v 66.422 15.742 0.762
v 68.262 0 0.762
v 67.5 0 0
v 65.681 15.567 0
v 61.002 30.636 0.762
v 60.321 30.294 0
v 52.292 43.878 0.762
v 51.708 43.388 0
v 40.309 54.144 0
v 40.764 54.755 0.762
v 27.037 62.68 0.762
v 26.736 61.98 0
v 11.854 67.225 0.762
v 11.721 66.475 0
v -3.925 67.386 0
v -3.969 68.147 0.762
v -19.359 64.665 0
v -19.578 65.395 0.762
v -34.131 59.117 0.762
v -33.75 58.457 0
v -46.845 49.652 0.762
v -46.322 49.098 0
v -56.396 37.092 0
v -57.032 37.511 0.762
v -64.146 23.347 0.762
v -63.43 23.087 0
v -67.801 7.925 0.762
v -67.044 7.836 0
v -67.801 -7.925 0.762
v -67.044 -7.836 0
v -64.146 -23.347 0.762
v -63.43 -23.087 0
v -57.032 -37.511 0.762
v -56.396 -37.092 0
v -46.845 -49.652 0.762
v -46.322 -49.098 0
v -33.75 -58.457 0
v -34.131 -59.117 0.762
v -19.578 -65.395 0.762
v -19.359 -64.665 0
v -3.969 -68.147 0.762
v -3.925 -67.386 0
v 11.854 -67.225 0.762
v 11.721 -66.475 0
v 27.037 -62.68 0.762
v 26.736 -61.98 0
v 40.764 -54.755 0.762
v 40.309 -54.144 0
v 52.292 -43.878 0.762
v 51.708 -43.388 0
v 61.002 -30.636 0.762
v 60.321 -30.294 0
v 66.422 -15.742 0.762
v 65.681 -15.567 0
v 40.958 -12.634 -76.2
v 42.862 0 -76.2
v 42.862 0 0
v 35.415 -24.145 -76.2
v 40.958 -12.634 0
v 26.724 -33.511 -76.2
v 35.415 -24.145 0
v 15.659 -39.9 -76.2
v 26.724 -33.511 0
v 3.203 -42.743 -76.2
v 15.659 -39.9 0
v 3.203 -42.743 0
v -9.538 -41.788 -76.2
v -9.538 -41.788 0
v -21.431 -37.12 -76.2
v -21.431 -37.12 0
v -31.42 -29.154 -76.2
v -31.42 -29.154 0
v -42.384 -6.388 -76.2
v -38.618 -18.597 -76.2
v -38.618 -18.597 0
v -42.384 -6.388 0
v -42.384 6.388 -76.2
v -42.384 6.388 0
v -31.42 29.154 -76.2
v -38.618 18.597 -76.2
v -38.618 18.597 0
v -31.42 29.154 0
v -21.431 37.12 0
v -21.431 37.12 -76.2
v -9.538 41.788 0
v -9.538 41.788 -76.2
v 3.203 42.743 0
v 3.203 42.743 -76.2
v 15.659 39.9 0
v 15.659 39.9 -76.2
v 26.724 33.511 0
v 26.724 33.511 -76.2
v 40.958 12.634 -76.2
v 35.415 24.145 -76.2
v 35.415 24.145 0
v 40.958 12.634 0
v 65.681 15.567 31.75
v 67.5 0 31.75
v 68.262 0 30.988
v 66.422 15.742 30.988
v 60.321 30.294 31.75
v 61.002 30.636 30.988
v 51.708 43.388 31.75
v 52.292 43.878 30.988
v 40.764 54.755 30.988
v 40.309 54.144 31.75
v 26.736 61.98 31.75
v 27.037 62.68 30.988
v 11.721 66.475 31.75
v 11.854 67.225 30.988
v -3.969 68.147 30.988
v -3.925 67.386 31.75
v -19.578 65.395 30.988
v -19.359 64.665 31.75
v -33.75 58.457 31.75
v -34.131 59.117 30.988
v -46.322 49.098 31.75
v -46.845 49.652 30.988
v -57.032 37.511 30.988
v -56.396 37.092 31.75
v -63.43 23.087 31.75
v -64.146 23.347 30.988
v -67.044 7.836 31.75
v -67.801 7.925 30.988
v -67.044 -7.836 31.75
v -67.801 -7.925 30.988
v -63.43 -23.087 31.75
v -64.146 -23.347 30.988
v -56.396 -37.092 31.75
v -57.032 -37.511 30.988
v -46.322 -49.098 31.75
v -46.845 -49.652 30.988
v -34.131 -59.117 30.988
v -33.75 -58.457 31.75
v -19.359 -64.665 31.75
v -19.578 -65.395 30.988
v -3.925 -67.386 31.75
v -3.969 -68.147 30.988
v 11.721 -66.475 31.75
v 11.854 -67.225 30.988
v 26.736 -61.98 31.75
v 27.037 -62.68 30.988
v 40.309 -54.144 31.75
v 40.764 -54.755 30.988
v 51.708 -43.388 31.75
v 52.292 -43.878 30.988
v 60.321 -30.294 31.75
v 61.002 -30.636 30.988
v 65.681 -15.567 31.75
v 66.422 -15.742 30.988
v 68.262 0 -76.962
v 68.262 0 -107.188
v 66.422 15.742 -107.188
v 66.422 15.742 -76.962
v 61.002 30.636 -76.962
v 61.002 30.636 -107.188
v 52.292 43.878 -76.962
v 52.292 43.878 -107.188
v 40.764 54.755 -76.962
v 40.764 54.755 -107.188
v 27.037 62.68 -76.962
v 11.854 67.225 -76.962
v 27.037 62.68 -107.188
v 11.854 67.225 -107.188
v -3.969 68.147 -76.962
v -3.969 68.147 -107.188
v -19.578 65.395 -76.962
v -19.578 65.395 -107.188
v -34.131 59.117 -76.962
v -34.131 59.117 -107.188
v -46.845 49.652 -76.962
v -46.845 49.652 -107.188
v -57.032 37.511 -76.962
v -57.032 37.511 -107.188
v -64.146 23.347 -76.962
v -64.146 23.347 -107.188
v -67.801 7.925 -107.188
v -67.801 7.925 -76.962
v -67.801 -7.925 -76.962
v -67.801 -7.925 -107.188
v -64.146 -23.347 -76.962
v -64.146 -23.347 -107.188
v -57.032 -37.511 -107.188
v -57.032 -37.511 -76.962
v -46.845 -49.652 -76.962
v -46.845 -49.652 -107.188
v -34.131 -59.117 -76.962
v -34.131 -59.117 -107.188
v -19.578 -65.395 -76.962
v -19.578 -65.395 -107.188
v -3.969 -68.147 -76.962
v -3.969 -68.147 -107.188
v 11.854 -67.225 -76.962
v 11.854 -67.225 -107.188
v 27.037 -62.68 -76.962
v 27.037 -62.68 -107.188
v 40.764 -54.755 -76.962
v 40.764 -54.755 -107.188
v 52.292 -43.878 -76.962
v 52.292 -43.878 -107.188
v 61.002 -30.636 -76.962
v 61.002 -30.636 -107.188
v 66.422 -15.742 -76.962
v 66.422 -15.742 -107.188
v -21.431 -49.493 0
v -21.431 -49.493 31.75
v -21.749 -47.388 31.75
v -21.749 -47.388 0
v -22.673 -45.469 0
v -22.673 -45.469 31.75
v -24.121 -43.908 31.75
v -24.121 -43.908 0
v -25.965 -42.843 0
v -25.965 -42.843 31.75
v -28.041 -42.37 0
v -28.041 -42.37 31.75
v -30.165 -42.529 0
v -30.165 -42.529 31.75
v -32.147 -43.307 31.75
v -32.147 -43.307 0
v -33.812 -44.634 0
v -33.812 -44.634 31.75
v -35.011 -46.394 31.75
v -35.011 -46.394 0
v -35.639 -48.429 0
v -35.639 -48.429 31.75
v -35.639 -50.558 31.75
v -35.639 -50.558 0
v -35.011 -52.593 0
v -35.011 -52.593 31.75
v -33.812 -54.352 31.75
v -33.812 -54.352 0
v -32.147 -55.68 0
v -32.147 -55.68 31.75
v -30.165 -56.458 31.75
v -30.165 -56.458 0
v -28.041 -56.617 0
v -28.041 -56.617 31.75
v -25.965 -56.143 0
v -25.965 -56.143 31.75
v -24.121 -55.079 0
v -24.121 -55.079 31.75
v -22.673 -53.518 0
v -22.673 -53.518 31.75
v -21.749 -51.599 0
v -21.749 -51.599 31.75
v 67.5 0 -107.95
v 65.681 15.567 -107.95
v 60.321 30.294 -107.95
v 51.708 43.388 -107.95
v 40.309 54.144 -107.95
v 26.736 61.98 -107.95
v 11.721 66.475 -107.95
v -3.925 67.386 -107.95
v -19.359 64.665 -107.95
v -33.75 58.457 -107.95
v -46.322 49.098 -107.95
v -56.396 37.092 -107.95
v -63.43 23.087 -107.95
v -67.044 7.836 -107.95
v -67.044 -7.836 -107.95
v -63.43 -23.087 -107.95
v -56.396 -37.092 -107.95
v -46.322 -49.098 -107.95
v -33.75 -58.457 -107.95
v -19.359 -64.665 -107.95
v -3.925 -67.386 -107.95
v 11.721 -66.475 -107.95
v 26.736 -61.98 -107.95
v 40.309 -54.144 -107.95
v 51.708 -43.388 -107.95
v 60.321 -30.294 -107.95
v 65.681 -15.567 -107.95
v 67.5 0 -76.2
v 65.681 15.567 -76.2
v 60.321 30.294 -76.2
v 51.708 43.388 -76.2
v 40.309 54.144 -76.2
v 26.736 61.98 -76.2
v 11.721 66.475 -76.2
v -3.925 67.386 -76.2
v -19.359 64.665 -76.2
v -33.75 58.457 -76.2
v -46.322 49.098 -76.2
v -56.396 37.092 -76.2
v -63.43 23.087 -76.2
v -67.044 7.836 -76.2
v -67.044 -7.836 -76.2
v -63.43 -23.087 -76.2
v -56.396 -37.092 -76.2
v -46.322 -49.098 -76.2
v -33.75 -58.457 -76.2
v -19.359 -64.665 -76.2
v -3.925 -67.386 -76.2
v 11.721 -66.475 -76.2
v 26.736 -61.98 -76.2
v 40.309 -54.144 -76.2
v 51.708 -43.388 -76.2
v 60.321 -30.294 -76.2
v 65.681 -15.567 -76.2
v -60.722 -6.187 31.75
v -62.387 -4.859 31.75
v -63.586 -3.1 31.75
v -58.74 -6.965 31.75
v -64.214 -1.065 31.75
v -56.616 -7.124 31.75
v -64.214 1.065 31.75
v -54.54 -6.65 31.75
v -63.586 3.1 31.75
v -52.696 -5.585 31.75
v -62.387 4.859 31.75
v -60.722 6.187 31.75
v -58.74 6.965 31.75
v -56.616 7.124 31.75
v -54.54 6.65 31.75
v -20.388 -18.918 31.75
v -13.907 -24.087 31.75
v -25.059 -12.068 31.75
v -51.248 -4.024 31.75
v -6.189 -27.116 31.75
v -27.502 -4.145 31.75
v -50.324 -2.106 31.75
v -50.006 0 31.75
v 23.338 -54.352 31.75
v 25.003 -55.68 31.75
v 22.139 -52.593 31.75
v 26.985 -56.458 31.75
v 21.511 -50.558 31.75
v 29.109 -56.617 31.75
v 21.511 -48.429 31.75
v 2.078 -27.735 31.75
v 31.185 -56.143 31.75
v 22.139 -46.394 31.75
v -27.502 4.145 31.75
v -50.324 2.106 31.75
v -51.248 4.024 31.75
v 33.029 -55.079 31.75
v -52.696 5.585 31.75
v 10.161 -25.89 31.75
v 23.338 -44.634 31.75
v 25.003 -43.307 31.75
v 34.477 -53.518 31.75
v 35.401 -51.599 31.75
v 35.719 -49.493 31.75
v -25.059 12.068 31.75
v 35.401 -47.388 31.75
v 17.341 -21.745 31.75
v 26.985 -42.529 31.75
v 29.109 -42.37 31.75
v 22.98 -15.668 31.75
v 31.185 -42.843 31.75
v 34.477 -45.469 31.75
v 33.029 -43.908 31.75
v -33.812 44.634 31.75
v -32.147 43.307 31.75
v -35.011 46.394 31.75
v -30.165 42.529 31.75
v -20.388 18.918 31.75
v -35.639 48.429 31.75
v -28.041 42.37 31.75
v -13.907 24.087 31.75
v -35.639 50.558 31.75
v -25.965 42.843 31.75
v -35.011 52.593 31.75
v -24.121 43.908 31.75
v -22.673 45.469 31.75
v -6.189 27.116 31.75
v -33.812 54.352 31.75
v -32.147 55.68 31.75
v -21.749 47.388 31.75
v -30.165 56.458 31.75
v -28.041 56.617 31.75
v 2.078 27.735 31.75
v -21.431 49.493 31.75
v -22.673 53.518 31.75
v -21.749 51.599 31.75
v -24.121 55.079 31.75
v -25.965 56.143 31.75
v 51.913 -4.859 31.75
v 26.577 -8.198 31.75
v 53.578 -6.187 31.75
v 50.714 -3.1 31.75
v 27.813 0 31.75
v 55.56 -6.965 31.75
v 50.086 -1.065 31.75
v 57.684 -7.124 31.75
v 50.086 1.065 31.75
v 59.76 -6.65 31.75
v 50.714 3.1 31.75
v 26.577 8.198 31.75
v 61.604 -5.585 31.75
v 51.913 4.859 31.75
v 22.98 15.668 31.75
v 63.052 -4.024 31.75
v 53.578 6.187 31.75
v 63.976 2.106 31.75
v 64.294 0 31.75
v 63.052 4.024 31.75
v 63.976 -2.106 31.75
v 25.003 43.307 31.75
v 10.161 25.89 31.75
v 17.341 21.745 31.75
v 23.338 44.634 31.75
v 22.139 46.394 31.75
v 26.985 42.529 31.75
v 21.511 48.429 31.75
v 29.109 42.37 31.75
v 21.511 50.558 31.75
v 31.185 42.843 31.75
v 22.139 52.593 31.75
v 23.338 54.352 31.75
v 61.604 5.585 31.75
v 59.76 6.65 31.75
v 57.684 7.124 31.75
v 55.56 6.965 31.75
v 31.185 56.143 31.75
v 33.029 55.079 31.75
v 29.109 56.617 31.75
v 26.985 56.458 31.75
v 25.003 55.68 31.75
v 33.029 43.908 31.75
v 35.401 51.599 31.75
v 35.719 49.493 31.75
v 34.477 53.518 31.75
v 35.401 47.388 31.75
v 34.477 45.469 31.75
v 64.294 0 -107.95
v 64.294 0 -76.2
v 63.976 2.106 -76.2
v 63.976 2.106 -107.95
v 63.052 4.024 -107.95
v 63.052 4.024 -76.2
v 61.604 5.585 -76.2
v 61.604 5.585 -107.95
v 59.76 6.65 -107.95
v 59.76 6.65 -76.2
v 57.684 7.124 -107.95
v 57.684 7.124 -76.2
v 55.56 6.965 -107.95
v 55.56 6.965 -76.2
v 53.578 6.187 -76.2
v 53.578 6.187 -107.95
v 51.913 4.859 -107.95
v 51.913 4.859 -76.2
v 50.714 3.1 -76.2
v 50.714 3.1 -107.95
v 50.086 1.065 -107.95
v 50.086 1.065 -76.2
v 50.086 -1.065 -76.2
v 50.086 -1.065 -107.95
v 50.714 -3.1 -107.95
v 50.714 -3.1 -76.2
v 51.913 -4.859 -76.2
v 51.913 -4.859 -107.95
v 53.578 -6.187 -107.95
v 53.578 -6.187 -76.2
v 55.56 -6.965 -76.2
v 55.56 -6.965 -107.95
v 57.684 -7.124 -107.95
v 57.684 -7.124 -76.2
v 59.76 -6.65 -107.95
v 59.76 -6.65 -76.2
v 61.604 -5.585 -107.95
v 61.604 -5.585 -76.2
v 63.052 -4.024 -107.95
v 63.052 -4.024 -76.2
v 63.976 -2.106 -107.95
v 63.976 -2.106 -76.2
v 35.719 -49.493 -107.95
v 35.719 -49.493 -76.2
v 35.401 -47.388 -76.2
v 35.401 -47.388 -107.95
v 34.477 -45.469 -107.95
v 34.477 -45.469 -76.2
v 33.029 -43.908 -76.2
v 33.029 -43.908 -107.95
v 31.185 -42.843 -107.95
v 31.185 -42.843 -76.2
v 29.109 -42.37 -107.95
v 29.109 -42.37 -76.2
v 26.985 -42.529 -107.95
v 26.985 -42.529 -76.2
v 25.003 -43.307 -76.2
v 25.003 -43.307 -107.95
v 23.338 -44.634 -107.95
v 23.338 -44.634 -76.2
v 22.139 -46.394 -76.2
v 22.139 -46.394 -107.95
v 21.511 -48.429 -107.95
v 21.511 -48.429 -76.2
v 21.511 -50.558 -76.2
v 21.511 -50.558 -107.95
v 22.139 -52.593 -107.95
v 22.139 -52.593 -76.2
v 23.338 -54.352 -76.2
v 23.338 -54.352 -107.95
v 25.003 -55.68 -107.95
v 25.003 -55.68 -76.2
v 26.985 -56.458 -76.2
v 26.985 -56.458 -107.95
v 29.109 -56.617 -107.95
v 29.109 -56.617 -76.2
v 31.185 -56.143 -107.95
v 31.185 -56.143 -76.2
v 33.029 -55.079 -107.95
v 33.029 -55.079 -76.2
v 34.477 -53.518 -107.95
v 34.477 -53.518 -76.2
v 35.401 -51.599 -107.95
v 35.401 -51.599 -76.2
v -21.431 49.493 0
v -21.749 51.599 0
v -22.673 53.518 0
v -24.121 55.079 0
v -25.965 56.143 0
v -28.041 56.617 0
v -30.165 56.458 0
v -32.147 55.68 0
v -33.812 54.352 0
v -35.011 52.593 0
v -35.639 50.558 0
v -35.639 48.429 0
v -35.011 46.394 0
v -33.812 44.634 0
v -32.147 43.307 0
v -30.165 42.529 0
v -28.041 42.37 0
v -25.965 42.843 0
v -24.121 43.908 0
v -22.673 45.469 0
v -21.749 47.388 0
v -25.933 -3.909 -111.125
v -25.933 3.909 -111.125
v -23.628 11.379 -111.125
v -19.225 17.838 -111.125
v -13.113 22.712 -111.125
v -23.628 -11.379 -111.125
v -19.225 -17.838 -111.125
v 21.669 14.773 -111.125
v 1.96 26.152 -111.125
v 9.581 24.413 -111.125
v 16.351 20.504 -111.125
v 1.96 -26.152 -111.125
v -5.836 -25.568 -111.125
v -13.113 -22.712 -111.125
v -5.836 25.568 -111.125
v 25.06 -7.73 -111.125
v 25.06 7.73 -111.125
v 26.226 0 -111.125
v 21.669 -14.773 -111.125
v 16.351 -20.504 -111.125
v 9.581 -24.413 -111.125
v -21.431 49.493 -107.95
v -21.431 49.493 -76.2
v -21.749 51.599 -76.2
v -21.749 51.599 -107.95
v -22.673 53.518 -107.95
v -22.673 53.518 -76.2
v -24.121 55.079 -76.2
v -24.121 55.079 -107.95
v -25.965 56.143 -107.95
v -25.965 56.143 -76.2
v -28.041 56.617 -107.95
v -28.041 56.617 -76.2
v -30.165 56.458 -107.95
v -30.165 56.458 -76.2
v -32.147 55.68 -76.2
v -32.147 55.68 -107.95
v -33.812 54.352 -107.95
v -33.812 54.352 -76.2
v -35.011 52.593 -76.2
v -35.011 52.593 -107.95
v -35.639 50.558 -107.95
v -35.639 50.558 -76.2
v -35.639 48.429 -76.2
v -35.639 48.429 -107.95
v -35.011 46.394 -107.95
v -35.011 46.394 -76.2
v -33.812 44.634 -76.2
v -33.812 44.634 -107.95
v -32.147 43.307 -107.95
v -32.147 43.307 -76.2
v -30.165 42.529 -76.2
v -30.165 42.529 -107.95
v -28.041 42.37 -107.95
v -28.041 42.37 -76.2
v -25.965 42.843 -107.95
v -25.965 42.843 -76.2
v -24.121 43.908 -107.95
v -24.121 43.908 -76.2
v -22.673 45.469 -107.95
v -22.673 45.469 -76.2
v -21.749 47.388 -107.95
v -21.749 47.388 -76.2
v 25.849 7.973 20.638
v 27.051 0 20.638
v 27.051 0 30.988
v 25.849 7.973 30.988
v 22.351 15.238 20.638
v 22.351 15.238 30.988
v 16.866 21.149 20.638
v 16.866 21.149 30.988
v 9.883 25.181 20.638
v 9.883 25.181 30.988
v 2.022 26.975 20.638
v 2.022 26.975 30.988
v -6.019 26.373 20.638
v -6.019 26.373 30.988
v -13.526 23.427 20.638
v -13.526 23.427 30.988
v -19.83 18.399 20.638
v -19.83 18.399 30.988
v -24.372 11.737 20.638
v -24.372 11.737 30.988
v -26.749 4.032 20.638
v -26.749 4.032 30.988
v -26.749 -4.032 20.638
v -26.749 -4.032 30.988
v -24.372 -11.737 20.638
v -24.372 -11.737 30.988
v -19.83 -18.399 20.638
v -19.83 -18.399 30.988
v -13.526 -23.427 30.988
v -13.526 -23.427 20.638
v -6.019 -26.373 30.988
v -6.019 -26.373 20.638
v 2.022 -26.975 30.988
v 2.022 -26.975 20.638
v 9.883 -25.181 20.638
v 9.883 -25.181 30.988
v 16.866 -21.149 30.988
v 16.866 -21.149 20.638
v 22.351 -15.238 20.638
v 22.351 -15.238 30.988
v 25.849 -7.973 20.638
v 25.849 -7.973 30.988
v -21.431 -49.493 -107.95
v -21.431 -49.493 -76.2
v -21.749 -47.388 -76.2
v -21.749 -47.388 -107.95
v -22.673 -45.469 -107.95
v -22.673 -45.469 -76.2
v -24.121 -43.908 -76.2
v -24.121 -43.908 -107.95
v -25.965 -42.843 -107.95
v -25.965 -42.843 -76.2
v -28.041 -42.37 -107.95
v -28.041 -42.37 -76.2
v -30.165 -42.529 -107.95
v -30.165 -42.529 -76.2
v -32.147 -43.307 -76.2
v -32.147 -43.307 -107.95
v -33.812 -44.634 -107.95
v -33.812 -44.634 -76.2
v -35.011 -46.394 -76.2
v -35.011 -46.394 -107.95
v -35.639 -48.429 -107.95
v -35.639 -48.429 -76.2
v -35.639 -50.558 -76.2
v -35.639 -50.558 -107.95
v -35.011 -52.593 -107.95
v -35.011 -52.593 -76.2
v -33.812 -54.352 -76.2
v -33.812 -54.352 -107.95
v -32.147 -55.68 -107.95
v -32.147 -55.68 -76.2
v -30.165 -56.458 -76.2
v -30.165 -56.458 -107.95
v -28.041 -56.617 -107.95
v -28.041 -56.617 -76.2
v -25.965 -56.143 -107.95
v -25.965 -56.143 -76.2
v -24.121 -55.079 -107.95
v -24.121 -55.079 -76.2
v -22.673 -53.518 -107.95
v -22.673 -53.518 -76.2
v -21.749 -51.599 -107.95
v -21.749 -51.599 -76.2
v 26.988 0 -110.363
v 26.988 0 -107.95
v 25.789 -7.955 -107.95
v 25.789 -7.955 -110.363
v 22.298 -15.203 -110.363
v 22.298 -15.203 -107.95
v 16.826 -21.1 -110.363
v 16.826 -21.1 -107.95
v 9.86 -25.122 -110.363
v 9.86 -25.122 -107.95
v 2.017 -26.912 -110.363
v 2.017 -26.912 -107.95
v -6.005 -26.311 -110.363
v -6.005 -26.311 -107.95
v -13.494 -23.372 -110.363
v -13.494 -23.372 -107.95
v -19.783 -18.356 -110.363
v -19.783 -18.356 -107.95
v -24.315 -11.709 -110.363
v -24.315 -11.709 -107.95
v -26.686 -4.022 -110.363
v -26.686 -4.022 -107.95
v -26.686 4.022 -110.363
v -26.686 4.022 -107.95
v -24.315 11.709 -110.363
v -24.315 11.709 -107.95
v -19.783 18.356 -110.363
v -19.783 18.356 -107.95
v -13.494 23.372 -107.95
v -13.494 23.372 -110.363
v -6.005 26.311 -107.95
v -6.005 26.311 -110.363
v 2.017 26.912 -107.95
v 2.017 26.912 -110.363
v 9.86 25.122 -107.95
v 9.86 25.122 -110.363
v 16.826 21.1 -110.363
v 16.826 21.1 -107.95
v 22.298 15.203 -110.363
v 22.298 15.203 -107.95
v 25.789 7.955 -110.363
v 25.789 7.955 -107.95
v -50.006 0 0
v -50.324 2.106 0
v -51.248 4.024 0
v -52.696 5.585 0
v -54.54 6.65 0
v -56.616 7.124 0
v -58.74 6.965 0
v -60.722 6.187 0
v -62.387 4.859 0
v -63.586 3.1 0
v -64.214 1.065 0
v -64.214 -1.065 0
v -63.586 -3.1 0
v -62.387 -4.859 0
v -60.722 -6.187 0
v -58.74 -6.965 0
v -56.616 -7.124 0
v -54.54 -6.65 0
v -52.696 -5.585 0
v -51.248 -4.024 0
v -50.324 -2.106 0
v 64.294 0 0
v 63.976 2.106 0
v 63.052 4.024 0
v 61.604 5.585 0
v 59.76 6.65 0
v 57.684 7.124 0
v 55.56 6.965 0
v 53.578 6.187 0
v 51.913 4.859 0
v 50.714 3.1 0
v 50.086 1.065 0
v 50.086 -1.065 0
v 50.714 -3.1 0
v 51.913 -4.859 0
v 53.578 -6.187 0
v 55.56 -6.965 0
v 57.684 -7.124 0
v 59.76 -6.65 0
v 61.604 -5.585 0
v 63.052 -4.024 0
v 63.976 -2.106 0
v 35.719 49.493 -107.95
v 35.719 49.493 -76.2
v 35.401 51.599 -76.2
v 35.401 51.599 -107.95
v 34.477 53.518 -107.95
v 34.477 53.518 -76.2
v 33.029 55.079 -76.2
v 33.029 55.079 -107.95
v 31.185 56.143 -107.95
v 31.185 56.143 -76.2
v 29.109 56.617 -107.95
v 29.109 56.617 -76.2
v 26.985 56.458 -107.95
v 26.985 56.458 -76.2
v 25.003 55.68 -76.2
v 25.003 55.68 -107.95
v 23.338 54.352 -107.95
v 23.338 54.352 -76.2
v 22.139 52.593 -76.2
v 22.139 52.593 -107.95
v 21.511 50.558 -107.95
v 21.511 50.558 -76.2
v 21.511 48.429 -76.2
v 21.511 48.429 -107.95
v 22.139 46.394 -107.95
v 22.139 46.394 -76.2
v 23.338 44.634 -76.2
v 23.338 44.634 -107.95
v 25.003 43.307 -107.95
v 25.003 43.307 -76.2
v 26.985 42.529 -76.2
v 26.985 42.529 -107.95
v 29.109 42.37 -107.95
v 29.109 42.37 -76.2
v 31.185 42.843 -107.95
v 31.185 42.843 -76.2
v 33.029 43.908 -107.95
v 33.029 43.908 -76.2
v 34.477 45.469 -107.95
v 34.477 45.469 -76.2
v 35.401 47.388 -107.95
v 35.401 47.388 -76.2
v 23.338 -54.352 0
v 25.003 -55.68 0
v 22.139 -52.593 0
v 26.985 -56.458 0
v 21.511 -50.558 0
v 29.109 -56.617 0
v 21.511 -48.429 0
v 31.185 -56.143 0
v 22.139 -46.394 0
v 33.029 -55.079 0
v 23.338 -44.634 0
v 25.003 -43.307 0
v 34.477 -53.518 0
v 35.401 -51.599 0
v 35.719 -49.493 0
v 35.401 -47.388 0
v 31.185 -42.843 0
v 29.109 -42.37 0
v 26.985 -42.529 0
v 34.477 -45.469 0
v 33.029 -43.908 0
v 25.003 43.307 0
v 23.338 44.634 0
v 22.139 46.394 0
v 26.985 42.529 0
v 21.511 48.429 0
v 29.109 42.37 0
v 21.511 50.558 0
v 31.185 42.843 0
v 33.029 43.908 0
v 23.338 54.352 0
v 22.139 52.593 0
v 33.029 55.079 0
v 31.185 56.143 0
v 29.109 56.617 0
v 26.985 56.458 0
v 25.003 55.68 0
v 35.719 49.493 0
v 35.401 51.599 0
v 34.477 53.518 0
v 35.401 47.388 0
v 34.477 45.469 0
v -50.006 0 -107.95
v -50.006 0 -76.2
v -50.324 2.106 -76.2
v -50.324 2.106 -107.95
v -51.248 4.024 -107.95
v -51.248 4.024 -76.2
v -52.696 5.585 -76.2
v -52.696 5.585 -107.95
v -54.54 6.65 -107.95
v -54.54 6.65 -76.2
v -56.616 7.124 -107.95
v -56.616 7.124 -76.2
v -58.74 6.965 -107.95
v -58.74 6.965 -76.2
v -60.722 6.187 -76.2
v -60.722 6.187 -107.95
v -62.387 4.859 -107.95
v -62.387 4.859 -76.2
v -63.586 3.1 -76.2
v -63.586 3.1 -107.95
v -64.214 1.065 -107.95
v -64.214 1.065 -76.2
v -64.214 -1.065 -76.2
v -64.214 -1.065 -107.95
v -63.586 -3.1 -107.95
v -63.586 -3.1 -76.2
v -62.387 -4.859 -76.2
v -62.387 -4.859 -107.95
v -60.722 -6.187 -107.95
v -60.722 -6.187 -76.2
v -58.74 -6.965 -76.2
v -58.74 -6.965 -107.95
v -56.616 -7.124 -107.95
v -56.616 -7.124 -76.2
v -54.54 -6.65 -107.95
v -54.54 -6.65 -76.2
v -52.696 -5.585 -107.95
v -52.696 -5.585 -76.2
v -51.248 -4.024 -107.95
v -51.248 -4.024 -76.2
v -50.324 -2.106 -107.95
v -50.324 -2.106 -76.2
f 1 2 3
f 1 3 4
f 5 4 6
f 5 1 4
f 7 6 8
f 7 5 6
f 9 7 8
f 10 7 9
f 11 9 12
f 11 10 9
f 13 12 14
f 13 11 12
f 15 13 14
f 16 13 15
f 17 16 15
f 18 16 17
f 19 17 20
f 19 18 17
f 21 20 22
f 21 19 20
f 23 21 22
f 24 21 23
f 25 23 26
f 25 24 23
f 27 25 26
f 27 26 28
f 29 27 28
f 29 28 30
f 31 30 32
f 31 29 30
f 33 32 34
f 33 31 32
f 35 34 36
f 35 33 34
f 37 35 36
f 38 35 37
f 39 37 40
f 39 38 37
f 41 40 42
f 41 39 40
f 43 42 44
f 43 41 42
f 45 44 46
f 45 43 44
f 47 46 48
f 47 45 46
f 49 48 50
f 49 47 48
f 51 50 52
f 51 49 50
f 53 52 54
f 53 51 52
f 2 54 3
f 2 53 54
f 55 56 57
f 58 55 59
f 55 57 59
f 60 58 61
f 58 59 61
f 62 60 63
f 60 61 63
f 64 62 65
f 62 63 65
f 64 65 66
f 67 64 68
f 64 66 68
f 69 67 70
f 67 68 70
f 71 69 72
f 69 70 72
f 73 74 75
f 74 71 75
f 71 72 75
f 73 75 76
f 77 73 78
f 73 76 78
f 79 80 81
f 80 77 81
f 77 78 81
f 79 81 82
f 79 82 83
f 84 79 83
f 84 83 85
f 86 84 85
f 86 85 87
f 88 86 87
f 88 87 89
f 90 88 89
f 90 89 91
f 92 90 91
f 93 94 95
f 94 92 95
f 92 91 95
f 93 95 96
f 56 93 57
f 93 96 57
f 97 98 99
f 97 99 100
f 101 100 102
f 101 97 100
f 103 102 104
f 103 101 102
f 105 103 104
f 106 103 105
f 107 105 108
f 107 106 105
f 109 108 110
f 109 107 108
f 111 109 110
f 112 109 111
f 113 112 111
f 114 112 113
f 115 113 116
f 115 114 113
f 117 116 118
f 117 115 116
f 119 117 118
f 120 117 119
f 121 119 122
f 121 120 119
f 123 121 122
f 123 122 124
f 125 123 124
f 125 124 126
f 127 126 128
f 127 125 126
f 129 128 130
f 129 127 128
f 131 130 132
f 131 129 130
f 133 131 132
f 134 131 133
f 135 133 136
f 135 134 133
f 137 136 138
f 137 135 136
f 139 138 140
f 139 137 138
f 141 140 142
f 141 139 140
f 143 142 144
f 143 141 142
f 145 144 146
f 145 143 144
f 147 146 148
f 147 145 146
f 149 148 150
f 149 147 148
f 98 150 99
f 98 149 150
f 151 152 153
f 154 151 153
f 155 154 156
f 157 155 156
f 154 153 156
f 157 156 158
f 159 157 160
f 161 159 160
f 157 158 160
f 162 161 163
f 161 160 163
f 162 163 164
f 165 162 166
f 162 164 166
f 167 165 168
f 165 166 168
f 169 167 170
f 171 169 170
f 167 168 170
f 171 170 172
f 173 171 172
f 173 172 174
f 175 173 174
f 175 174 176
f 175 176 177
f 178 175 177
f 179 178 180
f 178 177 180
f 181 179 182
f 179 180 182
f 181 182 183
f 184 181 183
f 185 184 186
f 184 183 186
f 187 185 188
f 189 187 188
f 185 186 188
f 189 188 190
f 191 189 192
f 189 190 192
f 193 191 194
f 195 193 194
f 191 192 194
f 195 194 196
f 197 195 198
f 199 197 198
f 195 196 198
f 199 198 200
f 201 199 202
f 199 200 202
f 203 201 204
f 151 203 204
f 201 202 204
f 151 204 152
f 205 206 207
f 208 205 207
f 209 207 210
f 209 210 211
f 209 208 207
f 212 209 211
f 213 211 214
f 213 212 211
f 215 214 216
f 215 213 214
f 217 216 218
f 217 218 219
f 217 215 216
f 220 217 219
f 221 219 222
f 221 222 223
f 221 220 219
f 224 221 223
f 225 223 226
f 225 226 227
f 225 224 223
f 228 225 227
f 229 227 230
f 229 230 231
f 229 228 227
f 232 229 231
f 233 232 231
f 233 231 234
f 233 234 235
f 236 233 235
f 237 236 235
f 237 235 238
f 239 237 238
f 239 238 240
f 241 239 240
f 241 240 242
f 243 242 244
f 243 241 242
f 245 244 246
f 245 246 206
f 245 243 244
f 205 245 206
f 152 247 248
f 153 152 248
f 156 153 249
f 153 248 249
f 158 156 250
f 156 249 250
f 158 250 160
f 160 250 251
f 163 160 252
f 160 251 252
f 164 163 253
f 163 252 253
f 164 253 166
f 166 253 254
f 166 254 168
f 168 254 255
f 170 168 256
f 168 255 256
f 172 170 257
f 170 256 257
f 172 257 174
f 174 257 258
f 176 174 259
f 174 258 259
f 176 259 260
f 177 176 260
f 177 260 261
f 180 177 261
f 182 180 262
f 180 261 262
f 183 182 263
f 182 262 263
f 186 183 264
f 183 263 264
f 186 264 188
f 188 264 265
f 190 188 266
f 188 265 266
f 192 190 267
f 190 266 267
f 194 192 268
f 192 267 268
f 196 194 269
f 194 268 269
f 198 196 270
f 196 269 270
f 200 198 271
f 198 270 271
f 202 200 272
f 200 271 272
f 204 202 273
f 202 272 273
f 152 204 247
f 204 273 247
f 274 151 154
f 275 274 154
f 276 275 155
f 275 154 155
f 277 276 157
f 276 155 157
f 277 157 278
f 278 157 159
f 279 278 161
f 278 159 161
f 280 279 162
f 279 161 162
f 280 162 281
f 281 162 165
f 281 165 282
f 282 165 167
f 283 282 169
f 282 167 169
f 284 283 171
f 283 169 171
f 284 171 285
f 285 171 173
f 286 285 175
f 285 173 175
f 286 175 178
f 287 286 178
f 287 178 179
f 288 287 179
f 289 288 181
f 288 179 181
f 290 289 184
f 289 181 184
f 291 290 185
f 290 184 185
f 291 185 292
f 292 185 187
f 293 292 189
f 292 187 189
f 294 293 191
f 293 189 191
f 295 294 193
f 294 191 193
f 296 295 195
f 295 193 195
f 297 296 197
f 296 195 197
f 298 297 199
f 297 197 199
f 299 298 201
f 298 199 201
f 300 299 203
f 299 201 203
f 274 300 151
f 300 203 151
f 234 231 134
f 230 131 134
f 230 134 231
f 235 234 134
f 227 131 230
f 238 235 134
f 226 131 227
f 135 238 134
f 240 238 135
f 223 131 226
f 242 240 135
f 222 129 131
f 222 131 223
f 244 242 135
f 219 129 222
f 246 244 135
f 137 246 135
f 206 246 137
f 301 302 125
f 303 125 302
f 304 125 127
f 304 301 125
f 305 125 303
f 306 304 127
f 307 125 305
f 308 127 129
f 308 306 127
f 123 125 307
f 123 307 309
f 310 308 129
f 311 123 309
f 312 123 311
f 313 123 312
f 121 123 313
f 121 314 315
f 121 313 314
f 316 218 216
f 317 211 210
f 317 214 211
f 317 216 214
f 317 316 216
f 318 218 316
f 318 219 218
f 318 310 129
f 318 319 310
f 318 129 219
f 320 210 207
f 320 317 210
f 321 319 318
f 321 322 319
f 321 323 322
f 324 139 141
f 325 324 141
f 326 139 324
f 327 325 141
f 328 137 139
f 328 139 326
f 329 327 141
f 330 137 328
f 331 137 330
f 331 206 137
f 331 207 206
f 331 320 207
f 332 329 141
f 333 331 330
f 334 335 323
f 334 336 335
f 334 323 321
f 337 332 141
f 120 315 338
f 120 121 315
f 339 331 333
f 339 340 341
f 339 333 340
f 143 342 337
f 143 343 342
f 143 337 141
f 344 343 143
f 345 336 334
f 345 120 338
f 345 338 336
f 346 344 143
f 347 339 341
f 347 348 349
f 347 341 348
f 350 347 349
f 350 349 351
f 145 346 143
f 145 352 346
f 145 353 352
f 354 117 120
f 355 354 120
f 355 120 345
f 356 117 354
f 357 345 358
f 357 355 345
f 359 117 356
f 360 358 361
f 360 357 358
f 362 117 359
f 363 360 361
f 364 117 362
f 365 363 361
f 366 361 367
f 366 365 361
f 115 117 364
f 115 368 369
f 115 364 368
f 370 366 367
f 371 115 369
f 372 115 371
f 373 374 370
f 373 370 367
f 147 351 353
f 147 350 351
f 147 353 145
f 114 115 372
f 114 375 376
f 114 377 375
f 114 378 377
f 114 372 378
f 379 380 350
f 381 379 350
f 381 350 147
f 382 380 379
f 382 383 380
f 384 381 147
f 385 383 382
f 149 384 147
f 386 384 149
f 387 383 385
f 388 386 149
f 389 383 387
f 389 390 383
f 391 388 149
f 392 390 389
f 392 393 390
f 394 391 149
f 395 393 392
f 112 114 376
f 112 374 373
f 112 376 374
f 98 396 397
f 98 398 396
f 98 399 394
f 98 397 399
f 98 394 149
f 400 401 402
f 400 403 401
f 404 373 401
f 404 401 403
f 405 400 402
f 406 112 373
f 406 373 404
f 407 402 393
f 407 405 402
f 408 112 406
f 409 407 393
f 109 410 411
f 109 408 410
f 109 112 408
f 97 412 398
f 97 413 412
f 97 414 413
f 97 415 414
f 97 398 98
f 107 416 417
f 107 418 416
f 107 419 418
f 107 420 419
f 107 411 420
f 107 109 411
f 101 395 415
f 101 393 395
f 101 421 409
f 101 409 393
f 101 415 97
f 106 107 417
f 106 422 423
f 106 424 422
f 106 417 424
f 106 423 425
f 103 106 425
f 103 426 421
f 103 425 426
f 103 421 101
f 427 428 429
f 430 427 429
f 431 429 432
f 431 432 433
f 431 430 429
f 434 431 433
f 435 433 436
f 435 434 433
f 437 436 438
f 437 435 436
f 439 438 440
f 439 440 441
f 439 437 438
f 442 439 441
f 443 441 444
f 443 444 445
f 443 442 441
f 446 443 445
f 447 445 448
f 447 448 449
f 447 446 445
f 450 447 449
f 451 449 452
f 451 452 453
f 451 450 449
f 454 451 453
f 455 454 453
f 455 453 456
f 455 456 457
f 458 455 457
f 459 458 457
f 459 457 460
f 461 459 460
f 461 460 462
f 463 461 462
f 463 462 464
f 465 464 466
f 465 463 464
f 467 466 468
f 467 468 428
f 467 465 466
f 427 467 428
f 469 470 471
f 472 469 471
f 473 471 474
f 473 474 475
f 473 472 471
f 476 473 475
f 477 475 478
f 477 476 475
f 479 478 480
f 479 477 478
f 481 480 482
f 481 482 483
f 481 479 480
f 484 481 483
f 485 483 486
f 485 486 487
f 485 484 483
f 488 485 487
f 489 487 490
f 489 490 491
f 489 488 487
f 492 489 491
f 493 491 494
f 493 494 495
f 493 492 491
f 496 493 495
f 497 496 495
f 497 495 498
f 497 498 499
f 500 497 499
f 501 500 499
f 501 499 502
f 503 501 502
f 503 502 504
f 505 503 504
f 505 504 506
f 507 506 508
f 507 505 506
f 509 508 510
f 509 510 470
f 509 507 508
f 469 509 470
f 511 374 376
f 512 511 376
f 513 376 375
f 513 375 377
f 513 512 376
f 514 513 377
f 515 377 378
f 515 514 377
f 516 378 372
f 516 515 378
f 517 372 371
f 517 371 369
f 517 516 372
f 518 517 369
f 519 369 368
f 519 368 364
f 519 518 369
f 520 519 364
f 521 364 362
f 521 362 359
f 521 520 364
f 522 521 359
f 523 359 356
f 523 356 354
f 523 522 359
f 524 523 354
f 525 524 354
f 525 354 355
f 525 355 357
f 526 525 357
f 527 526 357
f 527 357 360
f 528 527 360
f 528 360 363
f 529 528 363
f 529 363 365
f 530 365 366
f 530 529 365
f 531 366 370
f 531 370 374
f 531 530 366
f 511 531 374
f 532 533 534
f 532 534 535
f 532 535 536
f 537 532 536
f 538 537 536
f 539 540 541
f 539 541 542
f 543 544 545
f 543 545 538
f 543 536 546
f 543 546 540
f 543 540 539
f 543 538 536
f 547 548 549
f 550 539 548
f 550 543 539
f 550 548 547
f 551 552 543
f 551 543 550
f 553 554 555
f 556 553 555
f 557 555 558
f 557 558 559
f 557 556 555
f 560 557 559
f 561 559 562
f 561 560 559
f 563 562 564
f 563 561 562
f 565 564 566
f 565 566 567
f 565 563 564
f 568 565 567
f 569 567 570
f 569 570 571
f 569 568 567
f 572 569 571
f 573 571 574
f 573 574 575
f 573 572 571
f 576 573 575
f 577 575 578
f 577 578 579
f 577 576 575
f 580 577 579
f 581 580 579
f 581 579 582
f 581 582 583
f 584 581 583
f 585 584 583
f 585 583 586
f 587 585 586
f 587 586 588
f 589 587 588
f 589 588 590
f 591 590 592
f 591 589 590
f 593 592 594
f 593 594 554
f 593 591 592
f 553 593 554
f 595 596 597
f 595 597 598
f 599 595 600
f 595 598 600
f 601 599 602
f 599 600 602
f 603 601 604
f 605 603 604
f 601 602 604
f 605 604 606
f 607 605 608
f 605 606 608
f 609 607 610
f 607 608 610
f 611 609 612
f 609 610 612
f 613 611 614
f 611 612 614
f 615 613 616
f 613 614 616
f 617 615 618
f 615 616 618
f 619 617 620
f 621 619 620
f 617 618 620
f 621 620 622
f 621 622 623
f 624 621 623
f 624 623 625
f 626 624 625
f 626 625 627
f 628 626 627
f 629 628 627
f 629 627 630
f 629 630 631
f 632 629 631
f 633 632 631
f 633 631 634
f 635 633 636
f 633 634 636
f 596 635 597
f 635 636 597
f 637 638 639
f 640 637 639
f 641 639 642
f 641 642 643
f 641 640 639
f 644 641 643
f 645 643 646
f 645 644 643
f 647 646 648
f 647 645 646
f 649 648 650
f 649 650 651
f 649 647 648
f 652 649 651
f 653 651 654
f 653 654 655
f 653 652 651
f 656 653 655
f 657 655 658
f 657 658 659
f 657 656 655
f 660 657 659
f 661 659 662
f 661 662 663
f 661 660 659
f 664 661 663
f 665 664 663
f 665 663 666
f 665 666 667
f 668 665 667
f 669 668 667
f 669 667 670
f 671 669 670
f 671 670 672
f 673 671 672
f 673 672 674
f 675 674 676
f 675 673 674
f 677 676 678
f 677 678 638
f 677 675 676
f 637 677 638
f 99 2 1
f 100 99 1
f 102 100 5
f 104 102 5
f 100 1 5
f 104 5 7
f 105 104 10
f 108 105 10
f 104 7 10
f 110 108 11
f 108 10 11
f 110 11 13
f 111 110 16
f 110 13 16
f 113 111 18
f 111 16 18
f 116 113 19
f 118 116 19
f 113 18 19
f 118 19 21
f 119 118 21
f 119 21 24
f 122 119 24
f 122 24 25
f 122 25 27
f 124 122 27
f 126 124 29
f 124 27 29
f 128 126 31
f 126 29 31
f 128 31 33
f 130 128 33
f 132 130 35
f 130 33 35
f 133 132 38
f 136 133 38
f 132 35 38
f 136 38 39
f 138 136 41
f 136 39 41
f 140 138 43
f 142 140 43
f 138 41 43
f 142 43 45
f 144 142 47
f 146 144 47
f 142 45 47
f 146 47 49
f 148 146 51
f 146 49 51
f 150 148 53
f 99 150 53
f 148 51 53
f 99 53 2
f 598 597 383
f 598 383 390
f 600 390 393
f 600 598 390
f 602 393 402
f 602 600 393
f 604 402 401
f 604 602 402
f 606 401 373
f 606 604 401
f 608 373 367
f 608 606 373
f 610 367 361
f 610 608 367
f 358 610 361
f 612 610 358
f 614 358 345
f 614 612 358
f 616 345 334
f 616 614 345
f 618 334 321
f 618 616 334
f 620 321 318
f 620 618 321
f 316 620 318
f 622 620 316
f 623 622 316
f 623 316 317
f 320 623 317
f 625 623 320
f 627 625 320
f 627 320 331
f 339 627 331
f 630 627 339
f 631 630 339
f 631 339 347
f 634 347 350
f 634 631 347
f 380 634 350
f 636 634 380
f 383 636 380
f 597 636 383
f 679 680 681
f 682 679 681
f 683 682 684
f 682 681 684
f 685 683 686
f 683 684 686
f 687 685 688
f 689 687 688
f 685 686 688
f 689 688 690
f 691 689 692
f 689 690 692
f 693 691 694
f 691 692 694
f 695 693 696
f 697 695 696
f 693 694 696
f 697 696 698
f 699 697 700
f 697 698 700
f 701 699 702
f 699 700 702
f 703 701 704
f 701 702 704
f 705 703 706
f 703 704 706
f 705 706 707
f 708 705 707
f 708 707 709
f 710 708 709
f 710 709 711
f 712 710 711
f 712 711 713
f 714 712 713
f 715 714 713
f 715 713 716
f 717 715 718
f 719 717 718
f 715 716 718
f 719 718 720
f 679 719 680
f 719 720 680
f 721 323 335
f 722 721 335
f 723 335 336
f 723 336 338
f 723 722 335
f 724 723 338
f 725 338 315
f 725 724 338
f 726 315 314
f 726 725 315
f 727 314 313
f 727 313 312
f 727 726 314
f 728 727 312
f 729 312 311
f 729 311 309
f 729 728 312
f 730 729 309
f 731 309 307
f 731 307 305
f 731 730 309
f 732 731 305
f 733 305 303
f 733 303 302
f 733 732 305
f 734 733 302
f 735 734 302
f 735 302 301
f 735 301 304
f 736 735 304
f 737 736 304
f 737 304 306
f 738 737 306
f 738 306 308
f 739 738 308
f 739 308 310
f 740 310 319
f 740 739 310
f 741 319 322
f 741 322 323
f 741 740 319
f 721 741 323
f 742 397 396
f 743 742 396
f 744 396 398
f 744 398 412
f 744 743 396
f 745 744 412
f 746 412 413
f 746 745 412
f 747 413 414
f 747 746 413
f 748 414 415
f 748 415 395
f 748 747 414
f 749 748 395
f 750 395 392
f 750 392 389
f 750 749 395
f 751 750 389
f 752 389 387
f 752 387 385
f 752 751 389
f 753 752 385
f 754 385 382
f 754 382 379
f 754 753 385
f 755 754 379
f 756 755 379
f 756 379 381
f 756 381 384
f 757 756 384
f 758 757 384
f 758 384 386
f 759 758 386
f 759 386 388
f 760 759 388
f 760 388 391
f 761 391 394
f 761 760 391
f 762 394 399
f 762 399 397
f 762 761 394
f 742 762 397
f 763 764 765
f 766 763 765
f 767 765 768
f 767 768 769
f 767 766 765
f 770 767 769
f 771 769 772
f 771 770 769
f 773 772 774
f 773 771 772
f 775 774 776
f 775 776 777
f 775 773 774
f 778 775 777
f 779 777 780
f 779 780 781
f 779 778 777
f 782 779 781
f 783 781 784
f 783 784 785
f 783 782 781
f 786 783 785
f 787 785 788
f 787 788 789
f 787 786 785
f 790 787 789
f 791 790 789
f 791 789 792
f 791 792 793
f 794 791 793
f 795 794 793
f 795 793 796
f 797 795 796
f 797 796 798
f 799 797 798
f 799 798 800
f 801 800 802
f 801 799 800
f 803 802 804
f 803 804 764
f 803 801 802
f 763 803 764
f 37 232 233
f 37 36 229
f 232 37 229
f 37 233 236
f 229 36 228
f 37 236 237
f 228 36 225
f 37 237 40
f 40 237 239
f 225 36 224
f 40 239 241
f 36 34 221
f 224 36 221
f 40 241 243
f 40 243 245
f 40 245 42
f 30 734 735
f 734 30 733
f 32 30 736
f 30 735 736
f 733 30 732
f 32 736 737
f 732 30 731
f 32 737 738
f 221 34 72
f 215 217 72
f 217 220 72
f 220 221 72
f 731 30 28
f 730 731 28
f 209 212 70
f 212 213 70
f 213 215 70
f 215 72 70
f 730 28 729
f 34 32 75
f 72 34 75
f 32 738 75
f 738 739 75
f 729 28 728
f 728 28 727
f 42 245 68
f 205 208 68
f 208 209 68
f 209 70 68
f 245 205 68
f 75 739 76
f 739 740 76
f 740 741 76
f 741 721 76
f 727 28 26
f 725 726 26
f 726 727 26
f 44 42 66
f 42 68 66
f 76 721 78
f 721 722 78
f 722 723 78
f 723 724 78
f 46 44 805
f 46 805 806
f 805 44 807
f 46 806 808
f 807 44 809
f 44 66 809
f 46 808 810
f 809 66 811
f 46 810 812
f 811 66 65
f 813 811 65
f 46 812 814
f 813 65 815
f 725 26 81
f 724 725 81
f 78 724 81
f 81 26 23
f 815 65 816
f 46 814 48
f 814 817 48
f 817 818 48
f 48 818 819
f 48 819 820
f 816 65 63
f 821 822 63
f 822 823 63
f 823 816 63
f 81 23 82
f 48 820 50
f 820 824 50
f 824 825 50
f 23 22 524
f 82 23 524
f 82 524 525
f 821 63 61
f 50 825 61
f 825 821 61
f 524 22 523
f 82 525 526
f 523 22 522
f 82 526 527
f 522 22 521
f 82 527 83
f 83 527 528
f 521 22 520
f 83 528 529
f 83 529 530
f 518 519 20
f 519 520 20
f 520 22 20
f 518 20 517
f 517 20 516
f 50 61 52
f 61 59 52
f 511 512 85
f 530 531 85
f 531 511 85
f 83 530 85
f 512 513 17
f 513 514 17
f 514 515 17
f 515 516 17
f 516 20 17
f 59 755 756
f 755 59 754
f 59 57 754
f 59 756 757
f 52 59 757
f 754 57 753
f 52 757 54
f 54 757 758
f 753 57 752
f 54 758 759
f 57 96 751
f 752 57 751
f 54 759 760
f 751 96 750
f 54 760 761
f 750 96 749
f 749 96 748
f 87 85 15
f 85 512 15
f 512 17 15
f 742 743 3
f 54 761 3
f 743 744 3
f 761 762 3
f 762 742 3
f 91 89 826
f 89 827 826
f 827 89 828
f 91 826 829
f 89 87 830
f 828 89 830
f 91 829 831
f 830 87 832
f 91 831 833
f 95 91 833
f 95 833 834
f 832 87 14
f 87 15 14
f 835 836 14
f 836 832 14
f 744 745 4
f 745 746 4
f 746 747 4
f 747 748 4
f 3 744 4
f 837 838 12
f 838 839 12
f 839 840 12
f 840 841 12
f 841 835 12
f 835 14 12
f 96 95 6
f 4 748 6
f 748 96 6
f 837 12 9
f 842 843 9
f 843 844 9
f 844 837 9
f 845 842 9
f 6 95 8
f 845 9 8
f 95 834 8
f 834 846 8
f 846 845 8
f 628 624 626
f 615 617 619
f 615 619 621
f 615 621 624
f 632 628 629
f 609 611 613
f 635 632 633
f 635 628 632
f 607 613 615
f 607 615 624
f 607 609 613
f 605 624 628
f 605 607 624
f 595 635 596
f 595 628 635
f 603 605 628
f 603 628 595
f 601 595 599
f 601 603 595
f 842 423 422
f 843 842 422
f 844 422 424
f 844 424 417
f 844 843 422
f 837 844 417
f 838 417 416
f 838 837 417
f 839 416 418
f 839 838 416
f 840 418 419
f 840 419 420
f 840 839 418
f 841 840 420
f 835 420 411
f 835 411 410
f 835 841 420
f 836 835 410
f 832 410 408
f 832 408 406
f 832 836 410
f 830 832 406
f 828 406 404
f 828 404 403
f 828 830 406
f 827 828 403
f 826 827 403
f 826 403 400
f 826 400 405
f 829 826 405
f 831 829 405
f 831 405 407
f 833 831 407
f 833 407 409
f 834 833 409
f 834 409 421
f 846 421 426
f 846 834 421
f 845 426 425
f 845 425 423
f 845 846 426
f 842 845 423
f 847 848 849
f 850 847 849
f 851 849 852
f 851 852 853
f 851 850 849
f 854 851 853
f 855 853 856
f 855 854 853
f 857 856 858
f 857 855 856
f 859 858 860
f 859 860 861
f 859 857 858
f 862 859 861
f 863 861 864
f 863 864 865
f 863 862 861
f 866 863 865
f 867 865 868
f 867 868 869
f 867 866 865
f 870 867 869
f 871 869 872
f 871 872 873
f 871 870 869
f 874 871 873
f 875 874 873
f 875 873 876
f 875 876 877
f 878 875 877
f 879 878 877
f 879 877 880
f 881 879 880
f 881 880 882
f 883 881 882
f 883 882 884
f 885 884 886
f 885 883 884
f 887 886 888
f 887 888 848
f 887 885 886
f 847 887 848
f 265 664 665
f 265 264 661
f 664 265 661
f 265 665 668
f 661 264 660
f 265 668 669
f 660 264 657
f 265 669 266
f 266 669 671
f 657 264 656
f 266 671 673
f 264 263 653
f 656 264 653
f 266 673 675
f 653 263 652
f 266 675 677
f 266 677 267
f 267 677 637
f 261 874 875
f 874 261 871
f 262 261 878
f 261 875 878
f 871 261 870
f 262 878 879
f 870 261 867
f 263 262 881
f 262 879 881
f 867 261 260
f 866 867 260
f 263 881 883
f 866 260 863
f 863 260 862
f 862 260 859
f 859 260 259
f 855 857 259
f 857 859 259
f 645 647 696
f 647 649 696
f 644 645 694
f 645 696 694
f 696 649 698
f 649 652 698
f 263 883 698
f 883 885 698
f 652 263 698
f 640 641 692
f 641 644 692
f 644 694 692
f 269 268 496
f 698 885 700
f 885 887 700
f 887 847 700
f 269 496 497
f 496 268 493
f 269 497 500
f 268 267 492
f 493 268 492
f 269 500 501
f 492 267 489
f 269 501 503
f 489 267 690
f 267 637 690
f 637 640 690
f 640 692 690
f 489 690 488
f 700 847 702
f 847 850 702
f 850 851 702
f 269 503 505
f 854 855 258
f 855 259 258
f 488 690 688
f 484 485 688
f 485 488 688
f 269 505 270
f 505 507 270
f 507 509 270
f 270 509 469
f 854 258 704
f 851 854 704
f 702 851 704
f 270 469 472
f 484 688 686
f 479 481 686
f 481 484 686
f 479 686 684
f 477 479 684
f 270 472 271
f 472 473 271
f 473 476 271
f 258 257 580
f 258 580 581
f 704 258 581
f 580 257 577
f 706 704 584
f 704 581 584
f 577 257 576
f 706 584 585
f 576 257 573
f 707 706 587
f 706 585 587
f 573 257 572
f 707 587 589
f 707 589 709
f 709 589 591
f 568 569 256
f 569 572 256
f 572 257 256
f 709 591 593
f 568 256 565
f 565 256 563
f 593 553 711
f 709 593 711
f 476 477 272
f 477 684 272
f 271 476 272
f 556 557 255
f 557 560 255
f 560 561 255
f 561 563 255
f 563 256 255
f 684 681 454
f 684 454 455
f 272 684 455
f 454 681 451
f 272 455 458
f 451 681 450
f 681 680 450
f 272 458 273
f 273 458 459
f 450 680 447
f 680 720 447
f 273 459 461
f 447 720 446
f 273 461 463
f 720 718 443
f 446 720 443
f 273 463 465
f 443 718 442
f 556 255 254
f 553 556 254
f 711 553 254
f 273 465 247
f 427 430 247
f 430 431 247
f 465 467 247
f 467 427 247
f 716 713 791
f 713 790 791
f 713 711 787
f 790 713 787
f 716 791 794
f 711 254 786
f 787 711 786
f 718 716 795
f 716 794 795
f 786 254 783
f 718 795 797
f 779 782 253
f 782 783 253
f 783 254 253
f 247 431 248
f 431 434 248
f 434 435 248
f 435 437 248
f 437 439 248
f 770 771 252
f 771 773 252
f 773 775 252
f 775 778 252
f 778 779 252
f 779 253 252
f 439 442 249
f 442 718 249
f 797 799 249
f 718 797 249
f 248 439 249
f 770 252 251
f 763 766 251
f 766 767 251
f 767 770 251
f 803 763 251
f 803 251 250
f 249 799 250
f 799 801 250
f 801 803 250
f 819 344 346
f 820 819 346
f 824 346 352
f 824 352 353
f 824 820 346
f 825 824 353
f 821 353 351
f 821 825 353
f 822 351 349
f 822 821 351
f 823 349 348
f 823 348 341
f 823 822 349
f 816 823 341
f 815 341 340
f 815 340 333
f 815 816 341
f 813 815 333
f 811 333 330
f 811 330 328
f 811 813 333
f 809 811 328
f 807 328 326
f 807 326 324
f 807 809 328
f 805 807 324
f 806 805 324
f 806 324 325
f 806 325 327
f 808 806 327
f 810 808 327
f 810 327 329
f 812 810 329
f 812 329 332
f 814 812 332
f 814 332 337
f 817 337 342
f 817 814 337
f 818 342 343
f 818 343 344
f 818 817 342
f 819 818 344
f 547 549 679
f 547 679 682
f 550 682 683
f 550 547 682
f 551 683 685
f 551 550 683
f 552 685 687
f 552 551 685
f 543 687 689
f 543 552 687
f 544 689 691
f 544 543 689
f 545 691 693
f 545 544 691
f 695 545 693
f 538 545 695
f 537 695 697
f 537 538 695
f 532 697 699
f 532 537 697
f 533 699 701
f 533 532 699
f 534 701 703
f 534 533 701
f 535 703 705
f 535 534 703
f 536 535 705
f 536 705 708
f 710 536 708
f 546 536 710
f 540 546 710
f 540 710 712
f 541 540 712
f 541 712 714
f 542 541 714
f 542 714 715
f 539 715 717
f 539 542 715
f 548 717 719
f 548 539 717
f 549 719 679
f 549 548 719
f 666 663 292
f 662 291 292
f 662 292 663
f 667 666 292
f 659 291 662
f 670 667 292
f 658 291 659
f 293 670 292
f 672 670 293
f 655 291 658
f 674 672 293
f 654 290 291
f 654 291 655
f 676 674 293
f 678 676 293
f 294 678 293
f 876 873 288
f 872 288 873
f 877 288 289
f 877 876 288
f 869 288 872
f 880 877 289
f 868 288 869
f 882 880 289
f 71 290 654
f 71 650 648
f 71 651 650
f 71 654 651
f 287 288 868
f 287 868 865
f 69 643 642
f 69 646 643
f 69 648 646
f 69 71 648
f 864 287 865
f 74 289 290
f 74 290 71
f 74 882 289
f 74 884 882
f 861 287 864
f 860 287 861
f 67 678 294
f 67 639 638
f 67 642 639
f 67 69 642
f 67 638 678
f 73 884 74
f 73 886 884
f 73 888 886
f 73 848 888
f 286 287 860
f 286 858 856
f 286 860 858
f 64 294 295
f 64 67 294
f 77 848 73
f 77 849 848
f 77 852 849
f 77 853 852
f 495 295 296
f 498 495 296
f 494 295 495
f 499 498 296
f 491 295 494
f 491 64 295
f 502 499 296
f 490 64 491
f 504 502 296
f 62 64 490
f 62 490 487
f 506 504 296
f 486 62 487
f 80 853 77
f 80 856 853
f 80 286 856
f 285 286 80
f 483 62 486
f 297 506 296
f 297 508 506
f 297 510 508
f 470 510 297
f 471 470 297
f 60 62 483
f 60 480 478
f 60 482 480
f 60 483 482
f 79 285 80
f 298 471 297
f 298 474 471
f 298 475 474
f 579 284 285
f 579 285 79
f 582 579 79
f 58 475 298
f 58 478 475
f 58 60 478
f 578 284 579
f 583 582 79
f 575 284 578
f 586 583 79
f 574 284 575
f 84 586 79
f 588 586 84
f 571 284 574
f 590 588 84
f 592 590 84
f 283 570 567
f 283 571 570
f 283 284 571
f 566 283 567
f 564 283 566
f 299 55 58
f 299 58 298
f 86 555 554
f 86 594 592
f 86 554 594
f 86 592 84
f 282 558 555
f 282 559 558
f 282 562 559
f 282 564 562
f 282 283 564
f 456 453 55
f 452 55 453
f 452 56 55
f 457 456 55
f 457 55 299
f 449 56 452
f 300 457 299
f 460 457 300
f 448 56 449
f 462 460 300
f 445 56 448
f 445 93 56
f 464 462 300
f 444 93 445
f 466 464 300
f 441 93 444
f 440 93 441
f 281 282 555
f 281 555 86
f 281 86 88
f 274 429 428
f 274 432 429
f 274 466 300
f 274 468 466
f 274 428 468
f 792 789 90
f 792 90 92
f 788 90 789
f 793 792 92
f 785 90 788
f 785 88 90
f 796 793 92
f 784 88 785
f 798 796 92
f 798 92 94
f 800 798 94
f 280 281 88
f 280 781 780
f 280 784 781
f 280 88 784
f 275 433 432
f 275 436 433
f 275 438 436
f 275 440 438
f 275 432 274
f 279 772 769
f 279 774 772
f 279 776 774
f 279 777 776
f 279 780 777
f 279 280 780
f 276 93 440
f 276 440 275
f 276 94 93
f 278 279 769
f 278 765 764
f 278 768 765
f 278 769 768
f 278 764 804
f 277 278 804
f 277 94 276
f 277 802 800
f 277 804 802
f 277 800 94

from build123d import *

# Parameters (mm, degrees)
F0_R      = 68.2625
F0_R_2    = 7.14375
F1_DEPTH  = 31.75
F3_R      = 68.2625
F3_R_2    = 7.14375
F4_DEPTH  = 31.75
F5_R      = 42.8625
F6_DEPTH  = 81.28
F7_R      = 27.051
F8_DEPTH  = 11.1125
F9_R      = 26.9875
F10_DEPTH = 3.175
F11_SIZE  = 0.762


with BuildPart() as f1:
    # F0 (on Top) → F1 (new body)
    with BuildSketch(Plane.XY):
        Circle(F0_R)
        with Locations((-28.575, -49.493352)):
            Circle(F0_R_2, mode=Mode.SUBTRACT)
        with Locations((28.575, -49.493352)):
            Circle(F0_R_2, mode=Mode.SUBTRACT)
        with Locations((-57.15, 0)):
            Circle(F0_R_2, mode=Mode.SUBTRACT)
        with Locations((-28.575, 49.493352)):
            Circle(F0_R_2, mode=Mode.SUBTRACT)
        with Locations((57.15, 0)):
            Circle(F0_R_2, mode=Mode.SUBTRACT)
        with Locations((28.575, 49.493352)):
            Circle(F0_R_2, mode=Mode.SUBTRACT)
    extrude(amount=F1_DEPTH)



with BuildPart() as f4:
    # F3 (on offset) → F4 (new body)
    with BuildSketch(Plane.XY.offset(-107.95)):
        Circle(F3_R)
        with Locations((-28.575, -49.493352)):
            Circle(F3_R_2, mode=Mode.SUBTRACT)
        with Locations((28.575, -49.493352)):
            Circle(F3_R_2, mode=Mode.SUBTRACT)
        with Locations((-57.15, 0)):
            Circle(F3_R_2, mode=Mode.SUBTRACT)
        with Locations((-28.575, 49.493352)):
            Circle(F3_R_2, mode=Mode.SUBTRACT)
        with Locations((57.15, 0)):
            Circle(F3_R_2, mode=Mode.SUBTRACT)
        with Locations((28.575, 49.493352)):
            Circle(F3_R_2, mode=Mode.SUBTRACT)
    extrude(amount=F4_DEPTH)


with BuildPart() as f1_1:
    add(f1.part)

    add(f4.part)  # F6 merges F4
    # F5 (on face) → F6 (join)
    with BuildSketch(Plane(origin=(0, 0, 0), x_dir=(1, 0, 0), z_dir=(0, 0, -1))):
        Circle(F5_R)
    extrude(amount=F6_DEPTH)

    # F7 (on face) → F8 (cut)
    with BuildSketch(Plane.XY.offset(31.75)):
        Circle(F7_R)
    extrude(amount=-F8_DEPTH, mode=Mode.SUBTRACT)

    # F9 (on face) → F10 (join)
    with BuildSketch(Plane(origin=(0, 0, -107.95), x_dir=(1, 0, 0), z_dir=(0, 0, -1))):
        Circle(F9_R)
    extrude(amount=F10_DEPTH)

    # F11
    f11_edges = [f1_1.edges().sort_by_distance(p)[0] for p in [
        (-68.2625, 0, 31.75),
        (-27.051, 0, 31.75),
        (-68.2625, 0, 0),
        (-68.2625, 0, -76.2),
        (-68.2625, 0, -107.95),
        (-26.9875, 0, -111.125),
    ]]
    chamfer(f11_edges, length=F11_SIZE)


solid = f1_1.part
